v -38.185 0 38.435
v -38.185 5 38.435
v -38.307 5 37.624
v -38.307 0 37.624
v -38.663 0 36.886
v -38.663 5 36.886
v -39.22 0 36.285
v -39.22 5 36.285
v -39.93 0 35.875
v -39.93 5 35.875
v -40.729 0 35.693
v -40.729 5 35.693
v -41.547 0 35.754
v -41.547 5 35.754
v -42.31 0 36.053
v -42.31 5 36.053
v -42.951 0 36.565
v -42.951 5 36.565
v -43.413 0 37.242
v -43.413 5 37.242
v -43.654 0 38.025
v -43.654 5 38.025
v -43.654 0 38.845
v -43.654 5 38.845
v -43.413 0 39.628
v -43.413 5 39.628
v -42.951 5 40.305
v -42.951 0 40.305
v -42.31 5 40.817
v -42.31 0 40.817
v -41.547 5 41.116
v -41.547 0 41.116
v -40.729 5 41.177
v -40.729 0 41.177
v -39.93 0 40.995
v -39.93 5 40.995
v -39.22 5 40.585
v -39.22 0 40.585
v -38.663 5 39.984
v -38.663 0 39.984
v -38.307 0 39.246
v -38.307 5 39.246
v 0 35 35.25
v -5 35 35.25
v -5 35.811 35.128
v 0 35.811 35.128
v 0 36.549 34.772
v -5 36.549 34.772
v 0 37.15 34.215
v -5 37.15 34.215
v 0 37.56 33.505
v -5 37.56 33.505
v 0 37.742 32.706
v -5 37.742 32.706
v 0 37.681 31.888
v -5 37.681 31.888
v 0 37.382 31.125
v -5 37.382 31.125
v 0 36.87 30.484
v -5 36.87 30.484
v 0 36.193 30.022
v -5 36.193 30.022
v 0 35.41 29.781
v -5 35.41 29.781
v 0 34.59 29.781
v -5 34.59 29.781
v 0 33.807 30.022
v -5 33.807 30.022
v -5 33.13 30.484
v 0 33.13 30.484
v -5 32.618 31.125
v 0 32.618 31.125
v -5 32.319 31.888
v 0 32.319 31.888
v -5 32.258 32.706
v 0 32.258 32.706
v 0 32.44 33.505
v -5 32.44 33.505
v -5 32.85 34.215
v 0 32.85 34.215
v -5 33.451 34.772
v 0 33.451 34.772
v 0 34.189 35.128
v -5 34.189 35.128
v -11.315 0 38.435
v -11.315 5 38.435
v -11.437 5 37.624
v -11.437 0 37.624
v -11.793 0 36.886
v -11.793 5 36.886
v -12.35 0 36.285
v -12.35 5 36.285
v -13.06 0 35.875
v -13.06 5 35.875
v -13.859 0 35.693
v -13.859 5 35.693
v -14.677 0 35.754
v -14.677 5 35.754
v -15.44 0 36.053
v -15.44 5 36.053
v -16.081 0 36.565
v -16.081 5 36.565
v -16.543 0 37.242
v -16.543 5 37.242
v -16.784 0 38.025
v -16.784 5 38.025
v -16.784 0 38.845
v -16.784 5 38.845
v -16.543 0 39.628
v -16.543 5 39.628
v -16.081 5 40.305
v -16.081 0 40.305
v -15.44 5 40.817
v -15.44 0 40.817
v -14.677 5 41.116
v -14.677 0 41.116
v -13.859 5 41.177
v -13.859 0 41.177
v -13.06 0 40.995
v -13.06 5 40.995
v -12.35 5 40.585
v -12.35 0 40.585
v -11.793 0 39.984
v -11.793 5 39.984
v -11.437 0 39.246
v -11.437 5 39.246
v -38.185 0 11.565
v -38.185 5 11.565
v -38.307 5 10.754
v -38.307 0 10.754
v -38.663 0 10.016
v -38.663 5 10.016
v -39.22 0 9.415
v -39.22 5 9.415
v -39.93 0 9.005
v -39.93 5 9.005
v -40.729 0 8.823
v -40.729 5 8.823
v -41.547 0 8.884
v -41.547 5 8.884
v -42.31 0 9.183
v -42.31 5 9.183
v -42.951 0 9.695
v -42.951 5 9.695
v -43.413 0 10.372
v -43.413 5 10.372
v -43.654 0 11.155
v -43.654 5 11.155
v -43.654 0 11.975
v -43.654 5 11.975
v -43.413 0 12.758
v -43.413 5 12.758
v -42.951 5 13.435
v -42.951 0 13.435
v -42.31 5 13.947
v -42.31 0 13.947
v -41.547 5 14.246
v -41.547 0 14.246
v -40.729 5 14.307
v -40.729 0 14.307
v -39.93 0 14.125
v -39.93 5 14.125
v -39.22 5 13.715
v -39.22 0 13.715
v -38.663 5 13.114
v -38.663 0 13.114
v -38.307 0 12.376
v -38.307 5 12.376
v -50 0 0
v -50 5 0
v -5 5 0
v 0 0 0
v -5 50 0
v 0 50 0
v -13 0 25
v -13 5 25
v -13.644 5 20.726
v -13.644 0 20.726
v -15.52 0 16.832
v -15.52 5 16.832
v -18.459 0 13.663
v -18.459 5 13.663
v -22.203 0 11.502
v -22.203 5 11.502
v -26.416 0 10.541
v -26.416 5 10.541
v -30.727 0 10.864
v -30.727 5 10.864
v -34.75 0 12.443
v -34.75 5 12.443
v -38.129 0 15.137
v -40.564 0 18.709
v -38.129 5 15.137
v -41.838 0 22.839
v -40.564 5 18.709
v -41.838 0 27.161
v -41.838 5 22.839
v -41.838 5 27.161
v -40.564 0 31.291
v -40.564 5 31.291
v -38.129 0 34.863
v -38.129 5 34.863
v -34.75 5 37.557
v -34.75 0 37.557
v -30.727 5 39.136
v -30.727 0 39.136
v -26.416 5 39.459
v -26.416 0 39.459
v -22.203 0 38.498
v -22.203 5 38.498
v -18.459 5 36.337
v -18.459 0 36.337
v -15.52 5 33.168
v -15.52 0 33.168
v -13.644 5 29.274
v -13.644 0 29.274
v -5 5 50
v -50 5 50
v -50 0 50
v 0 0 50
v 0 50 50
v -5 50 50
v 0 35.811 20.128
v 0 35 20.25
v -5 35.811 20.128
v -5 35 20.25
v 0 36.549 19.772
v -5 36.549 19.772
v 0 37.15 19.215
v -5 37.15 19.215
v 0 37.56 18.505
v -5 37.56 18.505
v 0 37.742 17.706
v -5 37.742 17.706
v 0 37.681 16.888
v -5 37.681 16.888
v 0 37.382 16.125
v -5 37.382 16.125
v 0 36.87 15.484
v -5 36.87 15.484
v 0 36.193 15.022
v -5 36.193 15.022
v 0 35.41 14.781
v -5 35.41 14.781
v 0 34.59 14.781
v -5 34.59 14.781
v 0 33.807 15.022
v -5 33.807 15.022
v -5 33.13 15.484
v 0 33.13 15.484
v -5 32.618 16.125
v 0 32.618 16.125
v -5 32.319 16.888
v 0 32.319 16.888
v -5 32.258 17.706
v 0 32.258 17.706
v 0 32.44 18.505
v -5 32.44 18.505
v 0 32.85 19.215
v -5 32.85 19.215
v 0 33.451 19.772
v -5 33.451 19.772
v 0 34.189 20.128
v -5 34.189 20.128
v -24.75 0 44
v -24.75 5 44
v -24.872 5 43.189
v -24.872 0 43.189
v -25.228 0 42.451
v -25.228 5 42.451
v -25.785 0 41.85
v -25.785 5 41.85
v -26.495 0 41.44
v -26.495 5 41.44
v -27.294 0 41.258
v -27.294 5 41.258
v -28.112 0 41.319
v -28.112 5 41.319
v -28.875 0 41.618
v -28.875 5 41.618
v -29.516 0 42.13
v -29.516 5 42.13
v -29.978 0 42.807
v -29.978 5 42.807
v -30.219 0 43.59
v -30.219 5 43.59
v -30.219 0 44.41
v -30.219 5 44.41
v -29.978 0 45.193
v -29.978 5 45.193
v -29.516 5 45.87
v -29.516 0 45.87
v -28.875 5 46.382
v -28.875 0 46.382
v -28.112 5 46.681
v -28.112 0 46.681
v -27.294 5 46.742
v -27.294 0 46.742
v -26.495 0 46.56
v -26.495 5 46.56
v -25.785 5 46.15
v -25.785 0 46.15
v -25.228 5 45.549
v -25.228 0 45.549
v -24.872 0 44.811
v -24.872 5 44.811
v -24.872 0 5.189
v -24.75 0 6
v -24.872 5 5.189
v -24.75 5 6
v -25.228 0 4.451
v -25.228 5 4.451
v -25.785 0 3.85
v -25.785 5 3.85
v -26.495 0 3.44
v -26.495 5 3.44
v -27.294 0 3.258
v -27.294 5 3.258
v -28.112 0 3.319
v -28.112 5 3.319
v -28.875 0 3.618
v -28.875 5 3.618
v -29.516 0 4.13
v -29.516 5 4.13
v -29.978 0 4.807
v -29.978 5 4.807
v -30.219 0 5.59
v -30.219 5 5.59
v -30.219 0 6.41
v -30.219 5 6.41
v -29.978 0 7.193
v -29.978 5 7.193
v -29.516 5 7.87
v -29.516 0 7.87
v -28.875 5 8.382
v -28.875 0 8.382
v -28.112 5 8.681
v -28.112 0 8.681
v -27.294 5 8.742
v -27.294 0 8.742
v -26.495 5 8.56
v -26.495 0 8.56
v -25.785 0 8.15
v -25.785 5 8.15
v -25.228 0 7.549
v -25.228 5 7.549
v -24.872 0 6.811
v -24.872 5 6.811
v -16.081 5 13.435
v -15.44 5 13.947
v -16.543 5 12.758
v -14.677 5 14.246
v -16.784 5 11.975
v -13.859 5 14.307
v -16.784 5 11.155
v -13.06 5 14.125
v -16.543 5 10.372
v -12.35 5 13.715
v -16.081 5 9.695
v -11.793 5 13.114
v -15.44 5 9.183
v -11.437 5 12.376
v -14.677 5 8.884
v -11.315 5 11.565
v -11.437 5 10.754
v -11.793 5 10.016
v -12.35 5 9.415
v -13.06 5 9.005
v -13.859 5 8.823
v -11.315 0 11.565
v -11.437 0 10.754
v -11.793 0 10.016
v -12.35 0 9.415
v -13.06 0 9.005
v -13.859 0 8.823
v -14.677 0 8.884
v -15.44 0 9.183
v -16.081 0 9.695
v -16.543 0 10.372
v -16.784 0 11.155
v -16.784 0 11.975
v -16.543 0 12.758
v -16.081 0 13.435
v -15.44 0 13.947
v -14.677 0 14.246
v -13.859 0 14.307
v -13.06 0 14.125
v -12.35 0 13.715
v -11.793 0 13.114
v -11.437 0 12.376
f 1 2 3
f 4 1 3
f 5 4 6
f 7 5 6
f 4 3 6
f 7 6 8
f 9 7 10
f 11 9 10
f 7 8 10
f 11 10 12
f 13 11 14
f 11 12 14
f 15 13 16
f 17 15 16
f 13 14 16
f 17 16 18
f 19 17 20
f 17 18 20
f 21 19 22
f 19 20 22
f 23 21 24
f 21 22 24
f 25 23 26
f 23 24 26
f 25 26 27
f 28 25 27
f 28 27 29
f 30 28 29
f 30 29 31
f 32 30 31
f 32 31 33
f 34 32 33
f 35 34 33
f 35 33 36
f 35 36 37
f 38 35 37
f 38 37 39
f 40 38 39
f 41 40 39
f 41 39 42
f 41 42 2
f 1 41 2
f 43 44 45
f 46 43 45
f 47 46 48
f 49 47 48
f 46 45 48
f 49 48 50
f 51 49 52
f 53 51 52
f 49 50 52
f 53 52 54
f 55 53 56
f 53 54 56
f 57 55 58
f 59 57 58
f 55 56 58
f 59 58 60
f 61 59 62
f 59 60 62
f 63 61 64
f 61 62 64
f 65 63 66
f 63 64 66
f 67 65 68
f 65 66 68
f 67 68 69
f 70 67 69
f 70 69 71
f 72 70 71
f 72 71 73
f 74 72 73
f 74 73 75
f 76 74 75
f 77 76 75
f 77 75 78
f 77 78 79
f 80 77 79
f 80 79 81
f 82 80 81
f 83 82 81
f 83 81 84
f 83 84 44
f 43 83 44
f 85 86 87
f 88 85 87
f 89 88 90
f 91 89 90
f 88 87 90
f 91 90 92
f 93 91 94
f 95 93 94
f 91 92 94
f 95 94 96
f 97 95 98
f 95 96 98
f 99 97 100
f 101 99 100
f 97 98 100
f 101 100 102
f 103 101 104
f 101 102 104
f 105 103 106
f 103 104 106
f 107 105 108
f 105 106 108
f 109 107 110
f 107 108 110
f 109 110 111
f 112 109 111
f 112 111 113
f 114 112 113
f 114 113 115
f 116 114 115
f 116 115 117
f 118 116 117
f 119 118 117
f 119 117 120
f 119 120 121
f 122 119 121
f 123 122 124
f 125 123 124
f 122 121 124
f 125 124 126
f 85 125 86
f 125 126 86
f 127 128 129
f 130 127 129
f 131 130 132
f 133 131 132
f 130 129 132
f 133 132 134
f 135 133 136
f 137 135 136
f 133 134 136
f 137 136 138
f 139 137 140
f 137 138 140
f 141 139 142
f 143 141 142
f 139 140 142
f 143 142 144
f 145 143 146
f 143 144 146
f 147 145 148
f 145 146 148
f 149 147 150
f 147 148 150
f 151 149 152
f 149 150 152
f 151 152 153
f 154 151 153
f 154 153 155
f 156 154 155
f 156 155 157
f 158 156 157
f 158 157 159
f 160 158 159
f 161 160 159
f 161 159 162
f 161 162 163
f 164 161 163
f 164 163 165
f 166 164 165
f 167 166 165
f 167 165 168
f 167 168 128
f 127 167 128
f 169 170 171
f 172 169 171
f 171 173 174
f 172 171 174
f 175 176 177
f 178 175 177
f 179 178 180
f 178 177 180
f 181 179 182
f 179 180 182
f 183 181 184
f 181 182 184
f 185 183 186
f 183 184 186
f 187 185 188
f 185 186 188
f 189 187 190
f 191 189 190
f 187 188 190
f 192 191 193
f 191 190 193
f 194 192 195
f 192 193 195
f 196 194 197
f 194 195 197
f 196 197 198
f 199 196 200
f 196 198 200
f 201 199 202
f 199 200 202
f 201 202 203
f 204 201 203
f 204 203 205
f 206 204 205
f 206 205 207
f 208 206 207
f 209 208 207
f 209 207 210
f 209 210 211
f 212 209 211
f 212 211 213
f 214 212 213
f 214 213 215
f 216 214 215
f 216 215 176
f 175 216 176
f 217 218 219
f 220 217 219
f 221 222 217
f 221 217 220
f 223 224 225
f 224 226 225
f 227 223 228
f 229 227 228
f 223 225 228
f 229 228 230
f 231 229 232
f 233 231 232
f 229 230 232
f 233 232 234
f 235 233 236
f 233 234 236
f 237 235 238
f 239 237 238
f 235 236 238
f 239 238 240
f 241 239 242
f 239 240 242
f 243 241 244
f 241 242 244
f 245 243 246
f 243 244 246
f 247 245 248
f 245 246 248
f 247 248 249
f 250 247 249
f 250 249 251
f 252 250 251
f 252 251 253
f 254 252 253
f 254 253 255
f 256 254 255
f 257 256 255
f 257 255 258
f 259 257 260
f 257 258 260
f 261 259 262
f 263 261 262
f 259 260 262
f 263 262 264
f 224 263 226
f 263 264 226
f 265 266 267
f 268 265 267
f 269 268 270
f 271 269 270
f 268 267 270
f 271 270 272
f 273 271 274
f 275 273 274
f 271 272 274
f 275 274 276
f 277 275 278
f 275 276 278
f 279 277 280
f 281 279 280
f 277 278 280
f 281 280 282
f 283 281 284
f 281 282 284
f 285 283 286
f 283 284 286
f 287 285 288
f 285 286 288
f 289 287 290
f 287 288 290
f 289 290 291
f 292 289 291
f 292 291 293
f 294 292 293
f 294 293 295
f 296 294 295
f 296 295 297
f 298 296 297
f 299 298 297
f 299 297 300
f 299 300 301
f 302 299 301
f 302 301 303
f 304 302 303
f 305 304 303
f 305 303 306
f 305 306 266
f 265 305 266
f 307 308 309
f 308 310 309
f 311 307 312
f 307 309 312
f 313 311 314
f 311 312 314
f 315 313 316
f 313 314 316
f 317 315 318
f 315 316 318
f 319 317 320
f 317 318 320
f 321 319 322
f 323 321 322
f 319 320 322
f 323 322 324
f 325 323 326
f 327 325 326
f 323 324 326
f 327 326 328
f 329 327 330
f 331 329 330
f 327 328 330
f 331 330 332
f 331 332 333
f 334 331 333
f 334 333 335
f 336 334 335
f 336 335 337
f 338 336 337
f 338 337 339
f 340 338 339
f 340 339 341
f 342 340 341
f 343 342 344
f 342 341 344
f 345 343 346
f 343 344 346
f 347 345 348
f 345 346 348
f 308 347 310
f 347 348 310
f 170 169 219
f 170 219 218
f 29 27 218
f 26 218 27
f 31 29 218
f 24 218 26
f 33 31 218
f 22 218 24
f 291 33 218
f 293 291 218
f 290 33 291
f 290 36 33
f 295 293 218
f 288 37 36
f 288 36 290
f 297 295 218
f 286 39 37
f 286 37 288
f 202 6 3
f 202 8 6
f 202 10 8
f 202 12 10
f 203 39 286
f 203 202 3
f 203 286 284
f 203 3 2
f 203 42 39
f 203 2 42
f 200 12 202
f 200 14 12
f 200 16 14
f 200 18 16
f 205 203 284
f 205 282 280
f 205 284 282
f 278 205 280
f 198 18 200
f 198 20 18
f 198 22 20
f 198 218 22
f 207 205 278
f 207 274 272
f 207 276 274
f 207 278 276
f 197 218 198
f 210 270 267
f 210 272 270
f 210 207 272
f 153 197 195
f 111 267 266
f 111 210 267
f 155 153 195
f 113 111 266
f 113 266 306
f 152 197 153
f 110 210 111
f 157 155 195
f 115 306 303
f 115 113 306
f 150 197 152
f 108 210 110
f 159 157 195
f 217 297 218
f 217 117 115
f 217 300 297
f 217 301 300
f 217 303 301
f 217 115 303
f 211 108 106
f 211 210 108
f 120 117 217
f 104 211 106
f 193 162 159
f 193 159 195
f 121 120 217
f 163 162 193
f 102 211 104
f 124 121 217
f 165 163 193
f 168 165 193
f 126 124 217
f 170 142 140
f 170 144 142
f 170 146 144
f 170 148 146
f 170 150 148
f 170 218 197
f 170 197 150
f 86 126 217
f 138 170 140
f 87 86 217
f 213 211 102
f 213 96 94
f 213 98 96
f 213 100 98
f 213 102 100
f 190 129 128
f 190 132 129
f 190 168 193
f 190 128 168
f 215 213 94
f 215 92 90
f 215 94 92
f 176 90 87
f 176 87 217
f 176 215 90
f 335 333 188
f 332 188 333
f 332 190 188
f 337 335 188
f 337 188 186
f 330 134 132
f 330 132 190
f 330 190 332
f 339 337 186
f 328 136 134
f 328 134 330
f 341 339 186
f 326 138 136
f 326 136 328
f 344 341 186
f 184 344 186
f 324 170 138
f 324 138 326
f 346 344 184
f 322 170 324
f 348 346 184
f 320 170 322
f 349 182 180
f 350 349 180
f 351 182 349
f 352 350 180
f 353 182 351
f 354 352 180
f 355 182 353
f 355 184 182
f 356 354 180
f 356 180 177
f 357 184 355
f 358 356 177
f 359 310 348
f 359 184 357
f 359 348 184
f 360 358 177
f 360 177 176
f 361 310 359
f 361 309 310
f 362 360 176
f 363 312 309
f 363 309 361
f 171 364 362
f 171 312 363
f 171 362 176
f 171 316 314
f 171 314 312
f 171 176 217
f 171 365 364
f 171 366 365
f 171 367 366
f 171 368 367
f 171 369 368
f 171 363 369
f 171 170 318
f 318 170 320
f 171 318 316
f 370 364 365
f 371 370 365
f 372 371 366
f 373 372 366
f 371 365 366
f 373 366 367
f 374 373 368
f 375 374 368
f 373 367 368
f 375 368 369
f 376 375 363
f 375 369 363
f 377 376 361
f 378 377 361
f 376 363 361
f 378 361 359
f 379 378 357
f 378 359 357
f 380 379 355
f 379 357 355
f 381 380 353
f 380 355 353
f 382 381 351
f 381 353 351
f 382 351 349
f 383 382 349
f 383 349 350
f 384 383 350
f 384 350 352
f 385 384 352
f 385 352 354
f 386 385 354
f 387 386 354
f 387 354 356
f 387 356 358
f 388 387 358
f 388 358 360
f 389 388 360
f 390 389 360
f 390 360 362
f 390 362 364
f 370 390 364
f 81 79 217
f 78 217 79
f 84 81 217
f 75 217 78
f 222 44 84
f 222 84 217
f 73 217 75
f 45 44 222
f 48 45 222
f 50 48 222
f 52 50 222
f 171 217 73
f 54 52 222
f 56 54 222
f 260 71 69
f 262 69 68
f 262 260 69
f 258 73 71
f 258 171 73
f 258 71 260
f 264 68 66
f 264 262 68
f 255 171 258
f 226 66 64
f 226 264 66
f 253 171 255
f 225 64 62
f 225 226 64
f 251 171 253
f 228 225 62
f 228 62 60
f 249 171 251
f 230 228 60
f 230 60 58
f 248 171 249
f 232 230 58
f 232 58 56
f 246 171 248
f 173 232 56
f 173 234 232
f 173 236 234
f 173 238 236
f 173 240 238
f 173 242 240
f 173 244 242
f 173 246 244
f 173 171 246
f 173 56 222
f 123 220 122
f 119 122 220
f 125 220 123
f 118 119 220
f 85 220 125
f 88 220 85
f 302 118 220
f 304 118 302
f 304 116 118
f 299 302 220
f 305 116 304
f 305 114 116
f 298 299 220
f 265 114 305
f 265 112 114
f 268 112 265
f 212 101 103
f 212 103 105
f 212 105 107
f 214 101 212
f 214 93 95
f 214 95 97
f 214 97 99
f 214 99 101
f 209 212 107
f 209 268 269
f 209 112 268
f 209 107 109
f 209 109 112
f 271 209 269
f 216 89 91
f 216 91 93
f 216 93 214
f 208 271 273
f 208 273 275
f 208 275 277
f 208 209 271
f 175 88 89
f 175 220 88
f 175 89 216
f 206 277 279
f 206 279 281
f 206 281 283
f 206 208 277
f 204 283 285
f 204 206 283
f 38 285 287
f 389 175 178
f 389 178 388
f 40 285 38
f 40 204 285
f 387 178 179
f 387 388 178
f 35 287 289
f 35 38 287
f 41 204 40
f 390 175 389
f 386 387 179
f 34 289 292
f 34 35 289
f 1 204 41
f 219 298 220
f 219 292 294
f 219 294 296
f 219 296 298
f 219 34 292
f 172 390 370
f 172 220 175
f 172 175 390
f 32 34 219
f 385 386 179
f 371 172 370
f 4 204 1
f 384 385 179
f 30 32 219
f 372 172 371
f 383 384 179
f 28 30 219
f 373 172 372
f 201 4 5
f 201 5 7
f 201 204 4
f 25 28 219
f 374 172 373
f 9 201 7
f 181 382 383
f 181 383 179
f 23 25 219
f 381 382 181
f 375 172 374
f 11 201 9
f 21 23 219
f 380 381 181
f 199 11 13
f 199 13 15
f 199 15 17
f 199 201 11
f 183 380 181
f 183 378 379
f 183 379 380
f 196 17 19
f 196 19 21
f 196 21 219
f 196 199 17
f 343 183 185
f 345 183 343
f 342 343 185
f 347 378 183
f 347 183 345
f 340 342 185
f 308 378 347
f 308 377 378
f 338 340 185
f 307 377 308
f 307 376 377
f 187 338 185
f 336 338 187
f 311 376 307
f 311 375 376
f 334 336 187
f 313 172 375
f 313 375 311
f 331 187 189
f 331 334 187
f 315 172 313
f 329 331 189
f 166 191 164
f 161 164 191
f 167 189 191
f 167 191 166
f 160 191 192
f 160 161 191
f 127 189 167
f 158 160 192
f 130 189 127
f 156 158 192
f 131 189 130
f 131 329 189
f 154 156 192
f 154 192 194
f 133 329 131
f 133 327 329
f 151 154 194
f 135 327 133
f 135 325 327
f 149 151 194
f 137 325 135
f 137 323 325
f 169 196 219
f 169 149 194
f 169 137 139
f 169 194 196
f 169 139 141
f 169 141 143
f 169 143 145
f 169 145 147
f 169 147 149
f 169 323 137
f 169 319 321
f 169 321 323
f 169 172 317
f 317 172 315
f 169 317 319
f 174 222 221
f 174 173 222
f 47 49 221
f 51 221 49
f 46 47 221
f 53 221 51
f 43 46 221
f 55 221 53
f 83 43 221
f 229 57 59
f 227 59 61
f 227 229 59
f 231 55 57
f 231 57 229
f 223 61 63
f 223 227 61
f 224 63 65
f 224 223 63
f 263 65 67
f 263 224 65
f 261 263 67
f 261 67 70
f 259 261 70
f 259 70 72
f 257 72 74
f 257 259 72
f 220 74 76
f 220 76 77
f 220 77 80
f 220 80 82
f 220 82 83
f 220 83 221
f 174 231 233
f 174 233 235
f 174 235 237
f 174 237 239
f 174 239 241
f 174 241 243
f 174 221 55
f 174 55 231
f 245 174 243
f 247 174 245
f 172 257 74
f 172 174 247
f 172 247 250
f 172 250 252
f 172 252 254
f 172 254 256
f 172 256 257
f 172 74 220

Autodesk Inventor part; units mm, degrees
ref_plane "YZ Plane" through (0, 0, 0) normal (1, 0, 0) x (0, 1, 0)
ref_plane "XZ Plane" through (0, 0, 0) normal (0, 1, 0) x (-1, 0, 0)
ref_plane "XY Plane" through (0, 0, 0) normal (0, 0, 1) x (1, 0, 0)
sketch "Sketch1" plane through (0, 0, 0) normal (0, 0, 1) x (1, 0, 0)
  line L0 (0, 0) -> (-5, 0)
  line L1 (-5, 5) -> (-5, 50)
  line L2 (-5, 50) -> (0, 50)
  line L3 (0, 50) -> (0, 0)
  line L4 (0, 0) -> (-50, 0)
  line L5 (-50, 0) -> (-50, 5)
  line L6 (-50, 5) -> (-5, 5)
  line L7 (0, 5) -> (0, 0)
  dimension "d0" = 5
  dimension "d1" = 50
  dimension "d2" = 50
  dimension "d3" = 5
extrude "Extrusion1" add sketch "Sketch1" along normal blind 50
sketch "Sketch3" plane through (-50, 5, 0) normal (0, 1, 0) x (1, 0, 0)
  circle A0 centre (22.5, -25) radius 14.5
  line L0 (45, 0) -> (0, 0) projected
  line L1 (0, 0) -> (0, -50) projected
  line L2 (45, -50) -> (0, -50) projected
  line L3 (45, 0) -> (45, -50) projected
  line L4 (22.5, -25) -> (0, -25)
  line L5 (22.5, -25) -> (22.5, 0)
  line L6 (45, 0) -> (0, 0) projected
  circle A1 centre (35.935, -38.435) radius 2.75
  circle A2 centre (9.065, -38.435) radius 2.75
  circle A3 centre (22.5, -44) radius 2.75
  circle A4 centre (35.935, -11.565) radius 2.75
  circle A5 centre (9.065, -11.565) radius 2.75
  circle A6 centre (22.5, -6) radius 2.75
  point P0 (50, 0)
  dimension "d44" = 29
  dimension "d45" = 45
  dimension "d46" = 22.5
  dimension "d47" = 25
  dimension "d48" = 5.5
  dimension "d49" = 13.435
  dimension "d50" = 13.435
  dimension "d51" = 5.5
  dimension "d52" = 13.435
  dimension "d53" = 13.435
  dimension "d54" = 5.5
  dimension "d55" = 19
  dimension "d56" = 0
extrude "Extrusion2" cut sketch "Sketch3" against normal blind 20 contours A0 L4 L5 | L5 L4 A0 | A6 L5 | L5 A6 | A1 | A2 | A3 | A4 | A5
sketch "Sketch4" plane through (-5, 5, 0) normal (-1, 0, 0) x (0, 0, 1)
  circle A0 centre (17.5, 30) radius 2.75
  line L0 (0, 45) -> (0, 0) projected
  line L1 (0, 45) -> (50, 45) projected
  circle A1 centre (32.5, 30) radius 2.75
  point P0 (0, -5)
  dimension "d59" = 5.5
  dimension "d61" = 17.5
  dimension "d64" = 45
  dimension "d65" = 15
  dimension "d68" = 5.5
  dimension "d69" = 15
  dimension "d70" = 15
  dimension "d71" = 50
extrude "Extrusion3" cut sketch "Sketch4" against normal blind 20
equation "\"d2\" = d1"
equation "\"d3\" = d0"
equation "\"d46\" = 0.5 * d45"
equation "\"d50\" = d49"
equation "\"d52\" = d49"
equation "\"d53\" = d52"
equation "\"d61\" = -0.5 * d69 + 0.5 * d71"
equation "\"d65\" = -0.5 * d63 + 0.5 * d64"
equation "\"d70\" = d65"
equation "\"d63\" = 15"
properties part number "LBent_PScrew"
